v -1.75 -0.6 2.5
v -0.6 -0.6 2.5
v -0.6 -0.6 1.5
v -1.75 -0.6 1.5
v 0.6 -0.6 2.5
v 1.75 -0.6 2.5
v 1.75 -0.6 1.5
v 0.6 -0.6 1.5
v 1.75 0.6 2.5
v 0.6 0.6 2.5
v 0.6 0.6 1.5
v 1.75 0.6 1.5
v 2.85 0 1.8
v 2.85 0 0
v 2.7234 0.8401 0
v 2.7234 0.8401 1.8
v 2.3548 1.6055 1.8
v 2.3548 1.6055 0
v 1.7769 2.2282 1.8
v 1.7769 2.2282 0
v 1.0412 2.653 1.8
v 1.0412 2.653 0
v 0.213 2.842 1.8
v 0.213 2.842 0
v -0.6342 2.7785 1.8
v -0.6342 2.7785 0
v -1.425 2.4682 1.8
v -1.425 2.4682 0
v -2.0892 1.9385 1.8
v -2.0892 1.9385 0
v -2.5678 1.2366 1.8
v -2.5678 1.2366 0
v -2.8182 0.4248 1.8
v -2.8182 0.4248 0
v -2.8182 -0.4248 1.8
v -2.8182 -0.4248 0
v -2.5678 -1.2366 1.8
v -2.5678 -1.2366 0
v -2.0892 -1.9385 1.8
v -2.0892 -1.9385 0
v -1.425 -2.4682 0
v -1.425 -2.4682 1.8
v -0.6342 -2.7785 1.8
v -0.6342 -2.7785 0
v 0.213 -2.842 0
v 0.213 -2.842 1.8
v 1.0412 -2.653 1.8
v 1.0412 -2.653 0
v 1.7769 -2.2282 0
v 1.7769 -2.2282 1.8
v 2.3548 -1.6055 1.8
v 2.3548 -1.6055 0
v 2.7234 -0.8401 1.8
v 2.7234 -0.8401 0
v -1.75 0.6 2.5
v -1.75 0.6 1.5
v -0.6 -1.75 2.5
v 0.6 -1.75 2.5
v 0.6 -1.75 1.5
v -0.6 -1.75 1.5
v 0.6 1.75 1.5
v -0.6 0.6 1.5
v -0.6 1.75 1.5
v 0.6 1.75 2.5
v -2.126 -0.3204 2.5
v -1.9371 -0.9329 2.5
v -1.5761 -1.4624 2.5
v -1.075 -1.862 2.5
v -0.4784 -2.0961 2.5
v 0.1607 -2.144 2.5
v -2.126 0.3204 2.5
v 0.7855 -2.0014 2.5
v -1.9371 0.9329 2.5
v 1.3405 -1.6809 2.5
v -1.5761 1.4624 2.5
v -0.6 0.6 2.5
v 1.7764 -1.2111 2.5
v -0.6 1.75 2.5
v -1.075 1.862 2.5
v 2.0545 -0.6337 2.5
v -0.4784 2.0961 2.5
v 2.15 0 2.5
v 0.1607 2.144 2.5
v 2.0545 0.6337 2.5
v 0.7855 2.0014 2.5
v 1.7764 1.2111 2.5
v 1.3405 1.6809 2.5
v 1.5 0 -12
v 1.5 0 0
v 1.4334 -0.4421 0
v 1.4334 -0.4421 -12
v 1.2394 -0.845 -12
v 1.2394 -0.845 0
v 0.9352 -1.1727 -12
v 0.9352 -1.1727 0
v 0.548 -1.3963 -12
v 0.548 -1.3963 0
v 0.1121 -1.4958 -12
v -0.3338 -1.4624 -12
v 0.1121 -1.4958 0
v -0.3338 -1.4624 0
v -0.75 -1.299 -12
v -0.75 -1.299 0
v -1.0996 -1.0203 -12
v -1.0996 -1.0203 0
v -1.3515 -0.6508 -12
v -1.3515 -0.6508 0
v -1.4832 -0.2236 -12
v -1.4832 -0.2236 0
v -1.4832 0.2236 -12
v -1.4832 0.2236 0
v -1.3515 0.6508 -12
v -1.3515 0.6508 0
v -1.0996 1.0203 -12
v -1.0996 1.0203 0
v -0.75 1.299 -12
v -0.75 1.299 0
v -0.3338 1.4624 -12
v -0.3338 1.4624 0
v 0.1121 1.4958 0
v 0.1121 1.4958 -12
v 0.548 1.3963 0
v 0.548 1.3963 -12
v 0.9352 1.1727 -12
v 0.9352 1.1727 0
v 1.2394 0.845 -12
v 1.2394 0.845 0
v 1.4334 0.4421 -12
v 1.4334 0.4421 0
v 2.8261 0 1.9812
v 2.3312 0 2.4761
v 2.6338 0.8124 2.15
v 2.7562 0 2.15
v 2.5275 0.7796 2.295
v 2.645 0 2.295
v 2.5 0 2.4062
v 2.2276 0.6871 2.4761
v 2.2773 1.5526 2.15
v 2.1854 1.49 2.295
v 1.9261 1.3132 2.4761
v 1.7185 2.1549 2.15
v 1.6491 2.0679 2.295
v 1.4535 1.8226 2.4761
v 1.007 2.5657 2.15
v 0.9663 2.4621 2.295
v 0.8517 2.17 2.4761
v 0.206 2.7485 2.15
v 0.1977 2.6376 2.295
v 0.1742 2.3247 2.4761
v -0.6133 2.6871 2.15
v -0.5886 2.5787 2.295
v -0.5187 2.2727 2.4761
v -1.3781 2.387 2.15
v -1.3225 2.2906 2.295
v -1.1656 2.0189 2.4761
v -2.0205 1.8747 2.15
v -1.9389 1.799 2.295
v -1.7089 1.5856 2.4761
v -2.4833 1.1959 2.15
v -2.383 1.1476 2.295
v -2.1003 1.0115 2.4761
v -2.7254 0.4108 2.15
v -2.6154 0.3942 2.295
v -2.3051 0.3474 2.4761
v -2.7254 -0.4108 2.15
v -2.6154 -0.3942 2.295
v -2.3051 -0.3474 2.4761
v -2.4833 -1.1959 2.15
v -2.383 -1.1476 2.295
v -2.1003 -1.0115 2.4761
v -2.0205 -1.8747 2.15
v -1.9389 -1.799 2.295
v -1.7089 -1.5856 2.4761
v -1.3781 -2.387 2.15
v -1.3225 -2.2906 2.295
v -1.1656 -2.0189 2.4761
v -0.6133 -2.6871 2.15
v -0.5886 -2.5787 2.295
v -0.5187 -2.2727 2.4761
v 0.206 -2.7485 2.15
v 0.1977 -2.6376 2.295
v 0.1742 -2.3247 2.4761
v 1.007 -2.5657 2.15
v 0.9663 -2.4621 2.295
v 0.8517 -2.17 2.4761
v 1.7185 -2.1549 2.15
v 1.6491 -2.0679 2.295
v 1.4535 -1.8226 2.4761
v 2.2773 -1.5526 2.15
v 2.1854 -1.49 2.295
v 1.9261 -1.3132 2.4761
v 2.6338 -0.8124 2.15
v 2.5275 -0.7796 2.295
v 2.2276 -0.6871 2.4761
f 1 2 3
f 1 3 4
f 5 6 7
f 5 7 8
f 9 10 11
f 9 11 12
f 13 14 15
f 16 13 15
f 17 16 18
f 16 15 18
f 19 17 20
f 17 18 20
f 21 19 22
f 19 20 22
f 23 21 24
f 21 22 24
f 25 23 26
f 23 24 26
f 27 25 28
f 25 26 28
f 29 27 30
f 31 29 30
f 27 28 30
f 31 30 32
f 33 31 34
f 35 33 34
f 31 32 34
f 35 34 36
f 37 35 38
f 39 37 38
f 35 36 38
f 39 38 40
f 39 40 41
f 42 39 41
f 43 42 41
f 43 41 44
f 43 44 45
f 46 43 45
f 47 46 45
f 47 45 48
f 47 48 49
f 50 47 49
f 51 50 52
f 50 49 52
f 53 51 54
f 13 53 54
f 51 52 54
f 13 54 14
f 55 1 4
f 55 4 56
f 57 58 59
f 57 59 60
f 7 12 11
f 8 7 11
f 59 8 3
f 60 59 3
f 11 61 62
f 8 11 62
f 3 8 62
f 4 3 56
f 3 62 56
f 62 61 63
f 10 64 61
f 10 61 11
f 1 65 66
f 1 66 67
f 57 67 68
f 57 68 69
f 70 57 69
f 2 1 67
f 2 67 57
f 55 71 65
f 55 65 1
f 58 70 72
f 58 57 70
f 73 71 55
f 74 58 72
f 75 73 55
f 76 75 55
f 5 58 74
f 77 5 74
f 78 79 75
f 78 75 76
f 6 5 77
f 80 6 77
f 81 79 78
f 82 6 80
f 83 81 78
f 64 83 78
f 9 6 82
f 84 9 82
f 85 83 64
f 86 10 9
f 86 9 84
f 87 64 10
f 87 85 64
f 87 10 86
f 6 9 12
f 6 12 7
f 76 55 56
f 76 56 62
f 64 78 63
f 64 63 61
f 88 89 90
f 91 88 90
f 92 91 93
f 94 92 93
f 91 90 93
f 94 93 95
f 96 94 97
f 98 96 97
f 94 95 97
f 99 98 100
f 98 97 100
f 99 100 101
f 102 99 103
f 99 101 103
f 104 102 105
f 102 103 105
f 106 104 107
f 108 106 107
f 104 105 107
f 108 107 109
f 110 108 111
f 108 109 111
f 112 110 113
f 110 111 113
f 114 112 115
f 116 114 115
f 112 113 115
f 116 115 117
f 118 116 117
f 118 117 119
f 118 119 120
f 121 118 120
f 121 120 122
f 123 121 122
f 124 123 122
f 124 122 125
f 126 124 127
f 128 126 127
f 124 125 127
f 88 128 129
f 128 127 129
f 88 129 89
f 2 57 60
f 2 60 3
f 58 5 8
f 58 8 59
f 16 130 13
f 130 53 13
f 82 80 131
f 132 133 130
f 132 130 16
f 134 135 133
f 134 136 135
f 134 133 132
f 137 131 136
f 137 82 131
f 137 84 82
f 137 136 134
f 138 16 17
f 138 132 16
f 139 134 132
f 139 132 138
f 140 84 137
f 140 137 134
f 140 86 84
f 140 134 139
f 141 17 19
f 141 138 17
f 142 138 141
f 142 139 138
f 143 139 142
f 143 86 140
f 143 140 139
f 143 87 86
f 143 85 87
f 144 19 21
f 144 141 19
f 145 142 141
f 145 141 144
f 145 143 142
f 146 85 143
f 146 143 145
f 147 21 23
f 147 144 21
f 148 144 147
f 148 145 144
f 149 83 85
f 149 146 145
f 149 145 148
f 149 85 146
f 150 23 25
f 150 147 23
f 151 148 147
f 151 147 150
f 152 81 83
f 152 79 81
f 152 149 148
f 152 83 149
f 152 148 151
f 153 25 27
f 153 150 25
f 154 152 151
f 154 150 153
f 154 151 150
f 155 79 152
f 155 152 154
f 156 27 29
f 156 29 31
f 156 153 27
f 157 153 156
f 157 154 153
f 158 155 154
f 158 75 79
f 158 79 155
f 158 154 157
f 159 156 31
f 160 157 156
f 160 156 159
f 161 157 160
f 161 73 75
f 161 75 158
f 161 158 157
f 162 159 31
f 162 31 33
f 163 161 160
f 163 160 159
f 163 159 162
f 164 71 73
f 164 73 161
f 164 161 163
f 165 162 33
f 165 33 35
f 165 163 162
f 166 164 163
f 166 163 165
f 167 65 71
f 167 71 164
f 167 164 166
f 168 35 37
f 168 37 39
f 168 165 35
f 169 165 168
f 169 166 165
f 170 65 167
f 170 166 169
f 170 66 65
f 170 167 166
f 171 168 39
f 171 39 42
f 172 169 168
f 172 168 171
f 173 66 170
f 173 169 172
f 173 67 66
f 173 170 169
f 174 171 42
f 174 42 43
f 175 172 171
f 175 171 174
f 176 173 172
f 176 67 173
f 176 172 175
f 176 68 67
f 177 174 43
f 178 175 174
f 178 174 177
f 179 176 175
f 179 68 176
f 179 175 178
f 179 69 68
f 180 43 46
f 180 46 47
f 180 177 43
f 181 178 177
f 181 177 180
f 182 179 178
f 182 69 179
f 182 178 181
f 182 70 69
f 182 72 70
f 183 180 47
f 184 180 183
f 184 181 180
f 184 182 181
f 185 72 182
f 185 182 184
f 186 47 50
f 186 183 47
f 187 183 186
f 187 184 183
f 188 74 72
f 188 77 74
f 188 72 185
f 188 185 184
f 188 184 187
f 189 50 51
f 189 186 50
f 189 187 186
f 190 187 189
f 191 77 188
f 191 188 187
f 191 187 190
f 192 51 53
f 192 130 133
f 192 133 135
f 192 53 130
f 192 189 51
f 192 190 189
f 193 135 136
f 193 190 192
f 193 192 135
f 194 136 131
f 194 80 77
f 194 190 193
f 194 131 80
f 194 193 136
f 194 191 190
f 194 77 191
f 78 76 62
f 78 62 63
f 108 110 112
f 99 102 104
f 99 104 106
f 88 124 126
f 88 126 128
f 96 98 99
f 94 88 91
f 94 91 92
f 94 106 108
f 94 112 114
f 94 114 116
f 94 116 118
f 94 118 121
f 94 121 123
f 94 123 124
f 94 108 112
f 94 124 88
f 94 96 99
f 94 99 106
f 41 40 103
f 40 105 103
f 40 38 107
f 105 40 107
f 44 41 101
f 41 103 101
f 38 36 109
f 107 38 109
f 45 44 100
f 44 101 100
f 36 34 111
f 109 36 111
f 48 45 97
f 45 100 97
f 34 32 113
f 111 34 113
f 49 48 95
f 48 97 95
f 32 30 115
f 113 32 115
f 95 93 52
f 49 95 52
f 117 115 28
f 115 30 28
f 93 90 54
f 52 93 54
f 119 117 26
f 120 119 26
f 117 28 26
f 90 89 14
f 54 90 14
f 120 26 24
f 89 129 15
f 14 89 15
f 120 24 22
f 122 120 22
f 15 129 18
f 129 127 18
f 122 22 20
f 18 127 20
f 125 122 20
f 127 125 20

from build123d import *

# Parameters (mm, degrees)
SKETCH_R     = 2.85
PAD_DEPTH    = 2.5
POCKET_DEPTH = 1
FILLET_R     = 0.7
SKETCH002_R  = 1.5
PAD001_DEPTH = 12


with BuildPart() as part:
    # Sketch → Pad (new body)
    with BuildSketch(Plane.XY):
        Circle(SKETCH_R)
    extrude(amount=PAD_DEPTH)

    # Sketch001 (on Face3 of Pad) → Pocket (cut)
    with BuildSketch(Plane.XY.offset(2.5)):
        Polygon((-0.6, 1.75), (0.6, 1.75), (0.6, 0.6), (1.75, 0.6), (1.75, -0.6), (0.6, -0.6), (0.6, -1.75), (-0.6, -1.75), (-0.6, -0.6), (-1.75, -0.6), (-1.75, 0.6), (-0.6, 0.6), align=None)
    extrude(amount=-POCKET_DEPTH, mode=Mode.SUBTRACT)

    # Fillet
    fillet_edges = [part.edges().sort_by_distance(p)[0] for p in [
        (-2.85, 0, 2.5),
    ]]
    fillet(fillet_edges, radius=FILLET_R)

    # Sketch002 (on Face3 of Fillet) → Pad001 (join)
    with BuildSketch(Plane(origin=(0, 0, 0), x_dir=(1, 0, 0), z_dir=(0, 0, -1))):
        Circle(SKETCH002_R)
    extrude(amount=PAD001_DEPTH)


solid = part.part
